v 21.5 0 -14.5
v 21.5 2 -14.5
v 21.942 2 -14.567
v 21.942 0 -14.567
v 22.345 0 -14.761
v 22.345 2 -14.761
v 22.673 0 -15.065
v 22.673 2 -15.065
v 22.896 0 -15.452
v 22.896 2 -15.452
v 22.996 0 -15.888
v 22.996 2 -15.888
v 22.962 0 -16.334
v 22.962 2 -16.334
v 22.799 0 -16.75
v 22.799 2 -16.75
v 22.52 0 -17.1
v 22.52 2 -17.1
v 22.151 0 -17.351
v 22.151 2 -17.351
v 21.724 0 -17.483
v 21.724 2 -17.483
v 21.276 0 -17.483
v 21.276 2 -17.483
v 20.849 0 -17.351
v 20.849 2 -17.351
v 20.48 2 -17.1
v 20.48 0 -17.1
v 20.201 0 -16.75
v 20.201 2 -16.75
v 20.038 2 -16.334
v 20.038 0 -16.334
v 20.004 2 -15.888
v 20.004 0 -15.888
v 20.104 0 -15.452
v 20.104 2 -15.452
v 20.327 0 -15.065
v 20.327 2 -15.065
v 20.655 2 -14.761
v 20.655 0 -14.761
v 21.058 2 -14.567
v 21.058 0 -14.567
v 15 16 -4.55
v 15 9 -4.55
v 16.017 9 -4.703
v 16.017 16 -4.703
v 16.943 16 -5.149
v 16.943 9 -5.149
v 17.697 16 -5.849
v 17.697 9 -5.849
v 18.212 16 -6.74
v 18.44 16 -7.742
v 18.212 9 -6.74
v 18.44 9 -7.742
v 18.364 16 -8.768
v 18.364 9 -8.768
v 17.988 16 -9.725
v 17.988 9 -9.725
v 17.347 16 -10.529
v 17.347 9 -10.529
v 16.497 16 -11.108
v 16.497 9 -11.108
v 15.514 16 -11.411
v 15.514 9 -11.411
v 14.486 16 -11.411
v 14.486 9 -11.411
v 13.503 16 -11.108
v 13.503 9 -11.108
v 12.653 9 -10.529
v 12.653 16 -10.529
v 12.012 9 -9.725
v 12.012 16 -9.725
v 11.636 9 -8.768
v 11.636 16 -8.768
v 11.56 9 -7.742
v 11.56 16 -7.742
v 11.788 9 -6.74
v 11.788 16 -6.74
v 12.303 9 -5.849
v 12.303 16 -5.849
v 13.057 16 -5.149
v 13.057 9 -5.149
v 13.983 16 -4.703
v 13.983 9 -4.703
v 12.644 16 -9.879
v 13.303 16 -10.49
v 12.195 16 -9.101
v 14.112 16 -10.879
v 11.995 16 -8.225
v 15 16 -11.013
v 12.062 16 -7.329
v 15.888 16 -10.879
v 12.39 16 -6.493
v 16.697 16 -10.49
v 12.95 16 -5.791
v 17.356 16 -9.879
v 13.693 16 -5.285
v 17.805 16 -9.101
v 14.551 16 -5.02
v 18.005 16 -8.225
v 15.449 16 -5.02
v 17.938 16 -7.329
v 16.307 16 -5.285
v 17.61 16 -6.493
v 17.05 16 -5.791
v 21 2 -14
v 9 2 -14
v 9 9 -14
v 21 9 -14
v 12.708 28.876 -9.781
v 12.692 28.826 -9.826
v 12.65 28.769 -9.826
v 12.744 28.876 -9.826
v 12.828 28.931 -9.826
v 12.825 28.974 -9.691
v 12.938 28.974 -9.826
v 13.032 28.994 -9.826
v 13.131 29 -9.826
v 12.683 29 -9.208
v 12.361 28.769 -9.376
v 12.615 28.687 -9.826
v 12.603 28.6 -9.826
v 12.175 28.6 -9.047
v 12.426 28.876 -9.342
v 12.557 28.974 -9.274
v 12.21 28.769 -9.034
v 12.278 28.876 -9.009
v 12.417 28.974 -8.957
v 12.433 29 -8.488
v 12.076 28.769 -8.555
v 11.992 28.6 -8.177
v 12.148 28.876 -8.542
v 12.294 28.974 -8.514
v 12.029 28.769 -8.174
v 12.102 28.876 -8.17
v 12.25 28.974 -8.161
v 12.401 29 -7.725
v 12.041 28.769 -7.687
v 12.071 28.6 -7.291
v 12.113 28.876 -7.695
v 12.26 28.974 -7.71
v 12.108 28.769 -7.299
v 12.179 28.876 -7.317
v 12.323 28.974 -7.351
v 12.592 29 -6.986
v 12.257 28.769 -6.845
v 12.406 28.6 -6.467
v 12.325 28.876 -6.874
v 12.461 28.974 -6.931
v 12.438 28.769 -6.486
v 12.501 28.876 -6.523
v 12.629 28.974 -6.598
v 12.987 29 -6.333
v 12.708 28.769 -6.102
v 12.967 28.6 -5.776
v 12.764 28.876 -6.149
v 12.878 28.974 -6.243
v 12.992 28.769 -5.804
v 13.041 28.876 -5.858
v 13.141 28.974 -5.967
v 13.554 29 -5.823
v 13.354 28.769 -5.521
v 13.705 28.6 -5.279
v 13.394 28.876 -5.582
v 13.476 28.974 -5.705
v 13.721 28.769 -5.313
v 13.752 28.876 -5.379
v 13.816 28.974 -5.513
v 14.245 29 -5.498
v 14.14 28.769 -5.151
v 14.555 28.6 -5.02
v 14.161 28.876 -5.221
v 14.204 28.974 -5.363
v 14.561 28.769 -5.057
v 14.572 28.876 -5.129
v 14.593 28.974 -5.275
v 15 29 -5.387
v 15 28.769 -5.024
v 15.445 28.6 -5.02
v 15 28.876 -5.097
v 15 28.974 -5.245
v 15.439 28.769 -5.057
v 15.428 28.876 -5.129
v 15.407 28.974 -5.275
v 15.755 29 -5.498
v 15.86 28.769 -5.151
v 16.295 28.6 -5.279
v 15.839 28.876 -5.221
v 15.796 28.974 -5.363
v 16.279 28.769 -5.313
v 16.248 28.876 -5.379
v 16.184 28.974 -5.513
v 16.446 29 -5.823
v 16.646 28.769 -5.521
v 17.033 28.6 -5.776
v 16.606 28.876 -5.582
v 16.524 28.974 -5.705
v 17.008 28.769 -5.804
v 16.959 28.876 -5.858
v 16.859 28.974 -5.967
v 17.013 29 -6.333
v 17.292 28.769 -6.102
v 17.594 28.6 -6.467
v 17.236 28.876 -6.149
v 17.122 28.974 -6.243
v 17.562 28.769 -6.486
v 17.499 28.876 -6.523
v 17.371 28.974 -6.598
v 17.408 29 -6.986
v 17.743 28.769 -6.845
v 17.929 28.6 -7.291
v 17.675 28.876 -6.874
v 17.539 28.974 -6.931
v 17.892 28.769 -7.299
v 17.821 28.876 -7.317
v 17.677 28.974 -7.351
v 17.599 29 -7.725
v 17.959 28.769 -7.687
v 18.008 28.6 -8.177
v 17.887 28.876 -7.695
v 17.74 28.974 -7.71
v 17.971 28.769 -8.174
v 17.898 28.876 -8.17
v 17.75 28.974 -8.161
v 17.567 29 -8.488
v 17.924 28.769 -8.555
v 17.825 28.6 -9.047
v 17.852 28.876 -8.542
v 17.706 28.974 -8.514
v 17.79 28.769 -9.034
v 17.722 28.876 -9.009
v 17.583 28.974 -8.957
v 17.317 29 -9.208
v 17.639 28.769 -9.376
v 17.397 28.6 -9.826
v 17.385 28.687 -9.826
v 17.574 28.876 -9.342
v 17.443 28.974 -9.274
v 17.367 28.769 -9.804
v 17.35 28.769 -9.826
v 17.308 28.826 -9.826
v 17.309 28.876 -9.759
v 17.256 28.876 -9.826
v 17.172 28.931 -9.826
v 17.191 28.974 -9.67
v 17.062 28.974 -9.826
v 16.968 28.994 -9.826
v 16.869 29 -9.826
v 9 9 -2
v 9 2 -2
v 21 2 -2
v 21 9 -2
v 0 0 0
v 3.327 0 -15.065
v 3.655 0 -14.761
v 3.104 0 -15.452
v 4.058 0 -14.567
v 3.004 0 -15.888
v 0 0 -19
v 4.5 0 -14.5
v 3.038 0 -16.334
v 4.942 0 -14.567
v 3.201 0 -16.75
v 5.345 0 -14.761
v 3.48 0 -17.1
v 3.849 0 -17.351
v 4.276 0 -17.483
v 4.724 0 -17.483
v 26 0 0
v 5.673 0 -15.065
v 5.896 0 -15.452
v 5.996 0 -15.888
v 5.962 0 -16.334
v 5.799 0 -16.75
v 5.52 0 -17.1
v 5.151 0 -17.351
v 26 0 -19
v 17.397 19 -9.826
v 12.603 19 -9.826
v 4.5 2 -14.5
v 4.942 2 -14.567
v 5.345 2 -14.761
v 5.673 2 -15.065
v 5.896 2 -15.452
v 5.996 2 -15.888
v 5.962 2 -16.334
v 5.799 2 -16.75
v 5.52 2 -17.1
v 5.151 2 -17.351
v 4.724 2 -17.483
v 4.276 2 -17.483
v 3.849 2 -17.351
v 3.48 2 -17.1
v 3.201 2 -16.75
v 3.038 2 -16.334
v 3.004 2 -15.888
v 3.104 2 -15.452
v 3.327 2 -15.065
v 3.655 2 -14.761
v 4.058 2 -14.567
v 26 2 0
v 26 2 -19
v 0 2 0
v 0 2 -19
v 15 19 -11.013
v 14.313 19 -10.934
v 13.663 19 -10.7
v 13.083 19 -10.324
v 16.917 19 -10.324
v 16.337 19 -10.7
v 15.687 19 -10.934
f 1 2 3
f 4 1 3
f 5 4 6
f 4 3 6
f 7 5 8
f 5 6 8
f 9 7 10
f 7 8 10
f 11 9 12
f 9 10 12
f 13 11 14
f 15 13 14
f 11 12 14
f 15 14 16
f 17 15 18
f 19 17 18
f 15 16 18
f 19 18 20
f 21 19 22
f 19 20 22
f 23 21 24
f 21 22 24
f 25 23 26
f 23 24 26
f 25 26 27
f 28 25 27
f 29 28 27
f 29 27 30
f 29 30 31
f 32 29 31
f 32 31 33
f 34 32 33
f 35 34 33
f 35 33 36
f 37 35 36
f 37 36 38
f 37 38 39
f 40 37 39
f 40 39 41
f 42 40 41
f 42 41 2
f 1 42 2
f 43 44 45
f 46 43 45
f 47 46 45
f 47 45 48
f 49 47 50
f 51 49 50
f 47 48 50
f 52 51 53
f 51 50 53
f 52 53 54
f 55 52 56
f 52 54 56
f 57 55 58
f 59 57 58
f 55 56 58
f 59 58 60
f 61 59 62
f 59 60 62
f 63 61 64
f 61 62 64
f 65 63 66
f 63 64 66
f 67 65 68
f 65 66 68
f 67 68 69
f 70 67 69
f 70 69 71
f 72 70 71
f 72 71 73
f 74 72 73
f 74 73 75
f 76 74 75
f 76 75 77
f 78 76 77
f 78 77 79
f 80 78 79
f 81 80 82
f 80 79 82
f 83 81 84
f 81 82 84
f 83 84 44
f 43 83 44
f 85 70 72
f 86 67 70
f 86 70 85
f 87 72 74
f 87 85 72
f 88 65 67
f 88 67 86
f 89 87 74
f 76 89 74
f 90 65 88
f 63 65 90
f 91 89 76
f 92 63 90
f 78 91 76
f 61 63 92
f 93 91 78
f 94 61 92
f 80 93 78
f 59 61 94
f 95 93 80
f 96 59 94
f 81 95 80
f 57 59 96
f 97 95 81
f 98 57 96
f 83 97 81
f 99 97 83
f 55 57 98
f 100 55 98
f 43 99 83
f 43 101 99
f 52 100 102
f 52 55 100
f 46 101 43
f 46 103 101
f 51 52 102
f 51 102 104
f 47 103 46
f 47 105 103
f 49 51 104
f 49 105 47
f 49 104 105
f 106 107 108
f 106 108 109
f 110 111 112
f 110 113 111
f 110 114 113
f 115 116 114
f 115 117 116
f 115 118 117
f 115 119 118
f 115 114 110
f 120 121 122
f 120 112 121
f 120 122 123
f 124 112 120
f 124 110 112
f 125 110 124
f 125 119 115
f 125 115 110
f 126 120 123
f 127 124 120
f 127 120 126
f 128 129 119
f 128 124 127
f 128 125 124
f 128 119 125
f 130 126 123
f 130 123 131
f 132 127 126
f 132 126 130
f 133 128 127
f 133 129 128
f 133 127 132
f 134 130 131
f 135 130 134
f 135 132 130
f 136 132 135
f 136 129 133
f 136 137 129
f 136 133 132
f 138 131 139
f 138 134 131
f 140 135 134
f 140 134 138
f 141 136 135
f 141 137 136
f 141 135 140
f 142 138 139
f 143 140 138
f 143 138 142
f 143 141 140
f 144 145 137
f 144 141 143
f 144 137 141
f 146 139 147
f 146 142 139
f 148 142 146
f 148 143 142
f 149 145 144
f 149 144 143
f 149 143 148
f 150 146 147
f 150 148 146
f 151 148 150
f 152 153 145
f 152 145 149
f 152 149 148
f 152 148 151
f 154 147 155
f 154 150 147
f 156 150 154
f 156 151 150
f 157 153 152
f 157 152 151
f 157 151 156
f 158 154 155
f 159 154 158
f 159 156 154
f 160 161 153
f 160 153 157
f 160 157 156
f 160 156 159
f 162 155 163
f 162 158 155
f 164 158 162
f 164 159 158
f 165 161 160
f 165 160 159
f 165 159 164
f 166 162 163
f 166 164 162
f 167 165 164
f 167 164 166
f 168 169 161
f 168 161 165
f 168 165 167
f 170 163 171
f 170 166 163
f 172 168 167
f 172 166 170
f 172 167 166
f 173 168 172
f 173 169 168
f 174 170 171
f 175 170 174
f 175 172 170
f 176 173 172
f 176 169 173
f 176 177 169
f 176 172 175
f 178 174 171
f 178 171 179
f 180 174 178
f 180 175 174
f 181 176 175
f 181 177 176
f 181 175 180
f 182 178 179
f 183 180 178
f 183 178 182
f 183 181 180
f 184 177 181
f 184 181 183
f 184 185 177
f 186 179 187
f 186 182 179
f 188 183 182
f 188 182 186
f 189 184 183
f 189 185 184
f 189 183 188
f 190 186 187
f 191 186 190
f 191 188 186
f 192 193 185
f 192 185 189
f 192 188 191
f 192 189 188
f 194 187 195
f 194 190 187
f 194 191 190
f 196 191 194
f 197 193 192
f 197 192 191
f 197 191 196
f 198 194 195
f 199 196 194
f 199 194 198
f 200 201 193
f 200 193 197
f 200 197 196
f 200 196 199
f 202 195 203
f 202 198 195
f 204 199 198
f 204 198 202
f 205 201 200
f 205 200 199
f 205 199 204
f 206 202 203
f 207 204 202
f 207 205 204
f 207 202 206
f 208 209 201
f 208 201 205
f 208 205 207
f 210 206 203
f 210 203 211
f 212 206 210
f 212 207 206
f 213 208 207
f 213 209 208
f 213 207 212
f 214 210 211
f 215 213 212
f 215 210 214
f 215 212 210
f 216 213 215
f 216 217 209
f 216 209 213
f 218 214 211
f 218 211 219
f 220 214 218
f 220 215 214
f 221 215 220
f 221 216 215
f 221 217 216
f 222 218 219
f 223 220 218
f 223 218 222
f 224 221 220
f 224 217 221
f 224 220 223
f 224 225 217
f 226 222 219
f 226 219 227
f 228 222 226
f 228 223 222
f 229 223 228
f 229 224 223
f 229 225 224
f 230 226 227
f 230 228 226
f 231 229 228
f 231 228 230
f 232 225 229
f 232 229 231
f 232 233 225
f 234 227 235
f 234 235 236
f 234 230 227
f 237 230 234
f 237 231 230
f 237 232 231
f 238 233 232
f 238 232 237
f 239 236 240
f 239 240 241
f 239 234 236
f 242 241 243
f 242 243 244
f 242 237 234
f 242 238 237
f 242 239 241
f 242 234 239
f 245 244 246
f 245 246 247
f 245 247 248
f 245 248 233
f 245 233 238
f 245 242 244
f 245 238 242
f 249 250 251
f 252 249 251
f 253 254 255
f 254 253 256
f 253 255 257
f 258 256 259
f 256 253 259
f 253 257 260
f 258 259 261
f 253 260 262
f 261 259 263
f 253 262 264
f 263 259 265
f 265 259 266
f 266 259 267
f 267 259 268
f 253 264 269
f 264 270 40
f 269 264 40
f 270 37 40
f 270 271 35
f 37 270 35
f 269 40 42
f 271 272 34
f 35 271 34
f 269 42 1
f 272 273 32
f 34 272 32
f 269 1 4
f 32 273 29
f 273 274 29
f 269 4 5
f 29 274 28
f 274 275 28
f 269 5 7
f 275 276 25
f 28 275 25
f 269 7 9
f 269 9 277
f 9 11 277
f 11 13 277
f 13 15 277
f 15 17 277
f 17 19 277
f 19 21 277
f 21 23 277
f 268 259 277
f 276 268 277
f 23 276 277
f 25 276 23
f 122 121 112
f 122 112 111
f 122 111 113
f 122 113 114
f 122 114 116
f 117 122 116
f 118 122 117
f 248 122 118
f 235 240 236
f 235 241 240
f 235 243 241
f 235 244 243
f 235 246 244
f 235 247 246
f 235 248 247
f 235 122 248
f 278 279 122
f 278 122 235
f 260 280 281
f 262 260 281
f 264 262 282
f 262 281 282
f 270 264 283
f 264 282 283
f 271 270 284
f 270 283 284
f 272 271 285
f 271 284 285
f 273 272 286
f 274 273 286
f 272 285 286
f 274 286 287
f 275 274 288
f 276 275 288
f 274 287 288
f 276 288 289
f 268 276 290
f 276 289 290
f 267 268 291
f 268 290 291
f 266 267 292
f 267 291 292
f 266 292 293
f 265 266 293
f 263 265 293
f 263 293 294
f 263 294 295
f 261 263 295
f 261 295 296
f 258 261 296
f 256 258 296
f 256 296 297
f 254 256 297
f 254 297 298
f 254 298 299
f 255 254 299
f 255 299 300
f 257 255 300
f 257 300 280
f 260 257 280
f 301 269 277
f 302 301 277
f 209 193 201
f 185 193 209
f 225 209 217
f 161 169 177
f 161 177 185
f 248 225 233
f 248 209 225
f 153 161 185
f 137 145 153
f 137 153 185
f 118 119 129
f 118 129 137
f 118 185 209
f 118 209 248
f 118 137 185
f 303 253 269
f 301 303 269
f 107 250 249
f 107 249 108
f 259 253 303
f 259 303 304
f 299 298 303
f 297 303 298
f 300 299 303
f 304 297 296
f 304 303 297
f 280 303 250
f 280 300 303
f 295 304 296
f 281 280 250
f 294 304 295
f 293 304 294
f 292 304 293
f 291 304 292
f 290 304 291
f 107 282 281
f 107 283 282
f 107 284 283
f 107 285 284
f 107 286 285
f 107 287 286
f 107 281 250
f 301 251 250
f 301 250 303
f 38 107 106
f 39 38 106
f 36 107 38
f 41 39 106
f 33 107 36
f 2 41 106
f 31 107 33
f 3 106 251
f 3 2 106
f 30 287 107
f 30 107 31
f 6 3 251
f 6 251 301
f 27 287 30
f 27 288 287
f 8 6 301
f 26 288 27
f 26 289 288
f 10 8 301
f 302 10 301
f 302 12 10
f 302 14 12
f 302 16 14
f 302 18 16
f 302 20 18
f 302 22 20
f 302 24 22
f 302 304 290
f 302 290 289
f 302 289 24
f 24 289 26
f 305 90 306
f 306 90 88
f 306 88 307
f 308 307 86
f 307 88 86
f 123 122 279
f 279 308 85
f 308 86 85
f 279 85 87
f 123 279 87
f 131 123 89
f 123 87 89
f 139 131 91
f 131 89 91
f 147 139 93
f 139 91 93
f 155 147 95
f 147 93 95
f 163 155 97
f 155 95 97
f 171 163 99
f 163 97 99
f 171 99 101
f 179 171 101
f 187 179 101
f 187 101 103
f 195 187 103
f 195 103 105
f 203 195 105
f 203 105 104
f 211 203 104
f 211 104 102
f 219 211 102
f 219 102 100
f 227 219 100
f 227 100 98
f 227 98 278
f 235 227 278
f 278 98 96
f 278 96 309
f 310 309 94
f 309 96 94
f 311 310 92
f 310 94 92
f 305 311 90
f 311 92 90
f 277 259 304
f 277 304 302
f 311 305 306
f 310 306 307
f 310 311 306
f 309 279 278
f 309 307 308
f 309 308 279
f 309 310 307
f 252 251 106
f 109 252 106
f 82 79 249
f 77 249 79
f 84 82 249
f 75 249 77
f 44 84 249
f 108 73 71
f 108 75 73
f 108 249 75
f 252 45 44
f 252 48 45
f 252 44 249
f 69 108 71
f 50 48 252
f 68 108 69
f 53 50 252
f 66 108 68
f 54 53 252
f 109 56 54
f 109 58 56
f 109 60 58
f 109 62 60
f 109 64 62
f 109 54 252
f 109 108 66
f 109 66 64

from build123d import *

# Parameters (mm, degrees)
SKETCH1_W           = 26
SKETCH1_H           = 19
BOSS_EXTRUDE1_DEPTH = 2
SKETCH2_W           = 12
SKETCH2_H           = 12
BOSS_EXTRUDE2_DEPTH = 7
SKETCH3_R           = 3.45
BOSS_EXTRUDE3_DEPTH = 7
SKETCH4_R           = 3.013235608
BOSS_EXTRUDE4_DEPTH = 13
CUT_EXTRUDE1_START  = -10
CUT_EXTRUDE1_DEPTH  = 10
FILLET1_R           = 0.4
SKETCH6_R           = 1.5
CUT_EXTRUDE2_DEPTH  = 43.023802843


with BuildPart() as part:
    # Sketch1 → Boss-Extrude1 (new body)
    with BuildSketch(Plane(origin=(0, 0, 0), x_dir=(1, 0, 0), z_dir=(0, 1, 0))):
        with Locations((13, 9.5)):
            Rectangle(SKETCH1_W, SKETCH1_H)
    extrude(amount=BOSS_EXTRUDE1_DEPTH)

    # Sketch2 → Boss-Extrude2 (add)
    with BuildSketch(Plane(origin=(0, 2, 0), x_dir=(1, 0, 0), z_dir=(0, 1, 0))):
        with Locations((15, 8)):
            Rectangle(SKETCH2_W, SKETCH2_H)
    extrude(amount=BOSS_EXTRUDE2_DEPTH)

    # Sketch3 → Boss-Extrude3 (add)
    with BuildSketch(Plane(origin=(0, 9, 0), x_dir=(1, 0, 0), z_dir=(0, 1, 0))):
        with Locations(Location((15, 8, 0), (0, 0, 270))):
            Circle(SKETCH3_R)
    extrude(amount=BOSS_EXTRUDE3_DEPTH)

    # Sketch4 → Boss-Extrude4 (add)
    with BuildSketch(Plane(origin=(0, 16, 0), x_dir=(1, 0, 0), z_dir=(0, 1, 0))):
        with Locations(Location((15, 8, 0), (0, 0, 90))):
            Circle(SKETCH4_R)
    extrude(amount=BOSS_EXTRUDE4_DEPTH)

    # Sketch5 → Cut-Extrude1 (cut)
    with BuildSketch(Plane(origin=(0, 29, 0), x_dir=(1, 0, 0), z_dir=(0, 1, 0)).offset(CUT_EXTRUDE1_START)):
        with BuildLine():
            Line((12.603290186, 9.826299784), (17.396709814, 9.826299784))
            ThreePointArc((17.396709814, 9.826299784), (15, 11.013235608), (12.603290186, 9.826299784))
        make_face()
    extrude(amount=CUT_EXTRUDE1_DEPTH, mode=Mode.SUBTRACT)

    # Fillet1
    fillet1_edges = [part.edges().sort_by_distance(p)[0] for p in [
        (15, 29, -4.986764392),
    ]]
    fillet(fillet1_edges, radius=FILLET1_R)

    # Sketch6 → Cut-Extrude2 (cut, through all)
    with BuildSketch(Plane(origin=(0, 2, 0), x_dir=(1, 0, 0), z_dir=(0, 1, 0))):
        with Locations(Location((21.5, 16, 0), (0, 0, 270))):
            Circle(SKETCH6_R)
        with Locations(Location((4.5, 16, 0), (0, 0, 270))):
            Circle(SKETCH6_R)
    extrude(amount=-CUT_EXTRUDE2_DEPTH, mode=Mode.SUBTRACT)


solid = part.part
